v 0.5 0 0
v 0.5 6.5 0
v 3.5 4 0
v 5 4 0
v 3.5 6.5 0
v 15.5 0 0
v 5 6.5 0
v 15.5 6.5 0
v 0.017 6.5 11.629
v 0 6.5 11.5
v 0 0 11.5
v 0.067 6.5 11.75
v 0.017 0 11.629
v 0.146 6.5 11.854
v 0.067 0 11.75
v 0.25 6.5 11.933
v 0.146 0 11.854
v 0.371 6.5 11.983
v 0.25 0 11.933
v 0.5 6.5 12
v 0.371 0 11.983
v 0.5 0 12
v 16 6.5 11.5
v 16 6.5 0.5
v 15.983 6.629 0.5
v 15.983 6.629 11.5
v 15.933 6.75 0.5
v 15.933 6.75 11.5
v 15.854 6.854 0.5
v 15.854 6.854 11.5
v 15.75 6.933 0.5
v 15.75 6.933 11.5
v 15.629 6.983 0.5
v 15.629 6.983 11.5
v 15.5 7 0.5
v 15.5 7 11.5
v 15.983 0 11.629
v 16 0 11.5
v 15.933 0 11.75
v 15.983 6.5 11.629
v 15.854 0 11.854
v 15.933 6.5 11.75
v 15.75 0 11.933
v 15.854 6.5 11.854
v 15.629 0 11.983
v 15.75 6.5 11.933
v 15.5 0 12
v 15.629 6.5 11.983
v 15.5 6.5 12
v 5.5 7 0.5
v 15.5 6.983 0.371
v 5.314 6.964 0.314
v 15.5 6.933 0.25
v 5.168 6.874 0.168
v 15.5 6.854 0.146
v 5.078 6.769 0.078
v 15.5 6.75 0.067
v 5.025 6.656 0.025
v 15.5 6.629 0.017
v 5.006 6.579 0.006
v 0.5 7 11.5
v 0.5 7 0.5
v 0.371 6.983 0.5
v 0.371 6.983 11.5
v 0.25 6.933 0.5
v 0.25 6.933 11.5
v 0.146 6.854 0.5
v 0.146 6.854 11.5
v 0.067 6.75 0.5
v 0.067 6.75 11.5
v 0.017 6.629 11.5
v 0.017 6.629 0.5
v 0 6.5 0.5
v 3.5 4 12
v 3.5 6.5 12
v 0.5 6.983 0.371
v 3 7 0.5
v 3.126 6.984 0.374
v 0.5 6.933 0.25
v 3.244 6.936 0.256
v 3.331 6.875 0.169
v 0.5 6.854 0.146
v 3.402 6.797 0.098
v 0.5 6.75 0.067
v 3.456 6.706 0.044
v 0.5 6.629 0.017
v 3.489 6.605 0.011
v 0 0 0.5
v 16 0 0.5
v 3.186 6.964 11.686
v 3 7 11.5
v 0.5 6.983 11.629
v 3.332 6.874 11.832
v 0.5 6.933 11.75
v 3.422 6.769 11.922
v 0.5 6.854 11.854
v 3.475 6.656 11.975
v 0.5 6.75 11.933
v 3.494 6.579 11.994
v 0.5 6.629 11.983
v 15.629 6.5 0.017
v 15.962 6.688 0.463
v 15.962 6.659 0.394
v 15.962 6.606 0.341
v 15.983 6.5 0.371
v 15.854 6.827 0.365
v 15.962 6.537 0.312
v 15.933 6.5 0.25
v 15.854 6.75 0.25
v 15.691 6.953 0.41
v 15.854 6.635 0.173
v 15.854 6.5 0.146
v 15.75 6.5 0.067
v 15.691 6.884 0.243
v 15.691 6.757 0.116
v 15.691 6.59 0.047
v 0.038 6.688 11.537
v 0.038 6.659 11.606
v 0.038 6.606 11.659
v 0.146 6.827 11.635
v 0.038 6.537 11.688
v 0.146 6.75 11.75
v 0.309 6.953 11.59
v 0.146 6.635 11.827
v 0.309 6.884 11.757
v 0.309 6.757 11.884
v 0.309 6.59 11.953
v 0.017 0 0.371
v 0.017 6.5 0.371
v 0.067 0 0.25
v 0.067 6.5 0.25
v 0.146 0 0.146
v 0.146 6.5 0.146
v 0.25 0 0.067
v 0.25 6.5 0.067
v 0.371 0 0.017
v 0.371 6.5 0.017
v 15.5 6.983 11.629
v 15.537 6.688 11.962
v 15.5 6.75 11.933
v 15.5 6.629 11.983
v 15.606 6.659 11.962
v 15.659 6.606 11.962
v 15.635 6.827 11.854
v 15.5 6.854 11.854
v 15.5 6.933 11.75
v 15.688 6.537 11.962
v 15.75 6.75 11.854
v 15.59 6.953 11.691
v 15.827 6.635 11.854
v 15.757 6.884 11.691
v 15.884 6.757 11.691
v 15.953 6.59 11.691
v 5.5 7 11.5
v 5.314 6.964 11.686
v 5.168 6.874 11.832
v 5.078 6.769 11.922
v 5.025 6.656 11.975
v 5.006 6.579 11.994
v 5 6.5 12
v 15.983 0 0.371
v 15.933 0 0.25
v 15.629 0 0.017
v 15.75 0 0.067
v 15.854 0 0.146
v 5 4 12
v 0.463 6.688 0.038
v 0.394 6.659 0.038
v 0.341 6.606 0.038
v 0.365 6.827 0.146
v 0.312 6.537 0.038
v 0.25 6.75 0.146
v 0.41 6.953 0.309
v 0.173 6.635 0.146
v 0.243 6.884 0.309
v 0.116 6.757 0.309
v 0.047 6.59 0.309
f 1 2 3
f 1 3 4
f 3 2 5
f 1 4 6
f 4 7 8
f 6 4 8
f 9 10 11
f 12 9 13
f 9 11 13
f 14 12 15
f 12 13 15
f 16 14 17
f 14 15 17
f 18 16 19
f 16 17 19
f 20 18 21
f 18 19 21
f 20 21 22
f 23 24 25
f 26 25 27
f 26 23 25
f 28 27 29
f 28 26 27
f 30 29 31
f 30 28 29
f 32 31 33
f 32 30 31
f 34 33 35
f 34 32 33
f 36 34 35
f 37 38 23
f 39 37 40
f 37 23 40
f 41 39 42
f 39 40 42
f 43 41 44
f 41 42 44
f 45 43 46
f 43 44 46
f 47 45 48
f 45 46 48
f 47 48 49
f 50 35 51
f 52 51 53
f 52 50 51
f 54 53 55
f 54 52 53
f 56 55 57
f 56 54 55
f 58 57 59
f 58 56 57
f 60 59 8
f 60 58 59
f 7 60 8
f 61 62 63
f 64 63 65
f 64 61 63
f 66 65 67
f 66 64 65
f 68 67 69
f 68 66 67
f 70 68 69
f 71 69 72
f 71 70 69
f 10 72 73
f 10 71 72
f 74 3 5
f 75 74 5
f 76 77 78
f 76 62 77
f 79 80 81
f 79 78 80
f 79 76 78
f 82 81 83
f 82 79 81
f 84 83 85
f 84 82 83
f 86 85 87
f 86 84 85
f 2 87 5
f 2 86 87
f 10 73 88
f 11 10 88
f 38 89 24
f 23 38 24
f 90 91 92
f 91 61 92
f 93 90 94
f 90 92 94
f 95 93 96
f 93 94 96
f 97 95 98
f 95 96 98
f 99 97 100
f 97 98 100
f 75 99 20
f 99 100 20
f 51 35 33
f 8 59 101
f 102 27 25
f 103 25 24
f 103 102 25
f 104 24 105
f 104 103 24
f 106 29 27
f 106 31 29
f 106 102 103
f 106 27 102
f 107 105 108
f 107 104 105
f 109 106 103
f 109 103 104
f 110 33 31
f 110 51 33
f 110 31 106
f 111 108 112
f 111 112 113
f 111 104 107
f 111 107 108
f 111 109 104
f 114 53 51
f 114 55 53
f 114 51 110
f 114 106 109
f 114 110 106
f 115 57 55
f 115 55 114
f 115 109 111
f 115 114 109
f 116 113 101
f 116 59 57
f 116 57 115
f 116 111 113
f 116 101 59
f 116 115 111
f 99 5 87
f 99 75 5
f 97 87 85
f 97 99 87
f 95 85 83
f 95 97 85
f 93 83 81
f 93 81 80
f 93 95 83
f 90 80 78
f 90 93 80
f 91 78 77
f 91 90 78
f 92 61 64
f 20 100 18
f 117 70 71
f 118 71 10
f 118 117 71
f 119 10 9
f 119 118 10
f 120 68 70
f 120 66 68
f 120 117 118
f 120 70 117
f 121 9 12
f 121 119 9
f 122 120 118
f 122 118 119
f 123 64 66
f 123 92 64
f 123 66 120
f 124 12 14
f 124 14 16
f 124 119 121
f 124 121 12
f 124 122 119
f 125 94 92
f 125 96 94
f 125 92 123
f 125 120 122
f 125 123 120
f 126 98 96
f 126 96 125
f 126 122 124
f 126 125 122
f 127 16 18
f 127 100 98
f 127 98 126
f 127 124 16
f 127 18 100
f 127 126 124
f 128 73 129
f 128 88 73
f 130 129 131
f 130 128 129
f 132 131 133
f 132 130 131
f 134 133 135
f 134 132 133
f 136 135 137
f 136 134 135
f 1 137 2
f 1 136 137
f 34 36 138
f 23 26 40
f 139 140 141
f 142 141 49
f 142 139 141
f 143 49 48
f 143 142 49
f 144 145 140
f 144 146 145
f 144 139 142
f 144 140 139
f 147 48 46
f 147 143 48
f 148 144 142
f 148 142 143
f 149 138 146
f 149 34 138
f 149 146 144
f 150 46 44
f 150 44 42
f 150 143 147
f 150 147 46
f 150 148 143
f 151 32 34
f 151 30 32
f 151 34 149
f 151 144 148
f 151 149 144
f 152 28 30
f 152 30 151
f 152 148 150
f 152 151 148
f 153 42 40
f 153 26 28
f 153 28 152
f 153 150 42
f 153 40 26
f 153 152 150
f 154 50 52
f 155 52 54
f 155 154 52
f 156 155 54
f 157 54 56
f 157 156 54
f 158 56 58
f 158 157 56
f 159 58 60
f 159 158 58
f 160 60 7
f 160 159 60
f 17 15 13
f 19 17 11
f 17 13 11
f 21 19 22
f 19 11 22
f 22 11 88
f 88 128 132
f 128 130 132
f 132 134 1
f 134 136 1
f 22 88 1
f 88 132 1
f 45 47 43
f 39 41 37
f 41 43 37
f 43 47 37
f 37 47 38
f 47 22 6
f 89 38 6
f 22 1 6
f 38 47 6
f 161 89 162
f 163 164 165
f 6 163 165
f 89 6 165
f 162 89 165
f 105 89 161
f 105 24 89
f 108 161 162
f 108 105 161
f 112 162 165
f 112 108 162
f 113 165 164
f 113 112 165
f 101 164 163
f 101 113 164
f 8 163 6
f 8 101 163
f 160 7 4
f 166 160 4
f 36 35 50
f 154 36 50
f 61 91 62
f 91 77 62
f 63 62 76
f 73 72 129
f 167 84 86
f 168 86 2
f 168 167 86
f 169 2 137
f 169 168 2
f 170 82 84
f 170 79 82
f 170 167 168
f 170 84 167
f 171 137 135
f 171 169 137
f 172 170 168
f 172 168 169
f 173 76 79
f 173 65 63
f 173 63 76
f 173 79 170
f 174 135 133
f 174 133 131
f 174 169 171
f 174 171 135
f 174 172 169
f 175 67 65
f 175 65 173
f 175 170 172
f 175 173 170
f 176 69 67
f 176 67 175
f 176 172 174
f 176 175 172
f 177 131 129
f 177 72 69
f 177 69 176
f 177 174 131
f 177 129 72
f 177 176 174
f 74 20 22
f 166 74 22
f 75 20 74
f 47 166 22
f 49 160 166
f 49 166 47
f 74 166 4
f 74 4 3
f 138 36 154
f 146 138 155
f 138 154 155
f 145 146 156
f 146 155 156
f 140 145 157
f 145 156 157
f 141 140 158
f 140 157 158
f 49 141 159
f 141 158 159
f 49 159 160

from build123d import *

# Parameters (mm, degrees)
PAD_DEPTH = 12
FILLET_R  = 0.5


with BuildPart() as part:
    # Sketch → Pad (new body)
    with BuildSketch(Plane.XY):
        Polygon((0, 0), (16, 0), (16, 7), (5, 7), (5, 4), (3.5, 4), (3.5, 7), (0, 7), align=None)
    extrude(amount=PAD_DEPTH)

    # Fillet
    fillet_edges = [part.edges().sort_by_distance(p)[0] for p in [
        (10.5, 7, 0),
        (16, 7, 6),
        (5, 7, 6),
        (10.5, 7, 12),
        (1.75, 7, 12),
        (0, 7, 6),
        (3.5, 7, 6),
        (1.75, 7, 0),
        (0, 3.5, 0),
        (16, 3.5, 0),
        (16, 3.5, 12),
        (0, 3.5, 12),
    ]]
    fillet(fillet_edges, radius=FILLET_R)


solid = part.part
